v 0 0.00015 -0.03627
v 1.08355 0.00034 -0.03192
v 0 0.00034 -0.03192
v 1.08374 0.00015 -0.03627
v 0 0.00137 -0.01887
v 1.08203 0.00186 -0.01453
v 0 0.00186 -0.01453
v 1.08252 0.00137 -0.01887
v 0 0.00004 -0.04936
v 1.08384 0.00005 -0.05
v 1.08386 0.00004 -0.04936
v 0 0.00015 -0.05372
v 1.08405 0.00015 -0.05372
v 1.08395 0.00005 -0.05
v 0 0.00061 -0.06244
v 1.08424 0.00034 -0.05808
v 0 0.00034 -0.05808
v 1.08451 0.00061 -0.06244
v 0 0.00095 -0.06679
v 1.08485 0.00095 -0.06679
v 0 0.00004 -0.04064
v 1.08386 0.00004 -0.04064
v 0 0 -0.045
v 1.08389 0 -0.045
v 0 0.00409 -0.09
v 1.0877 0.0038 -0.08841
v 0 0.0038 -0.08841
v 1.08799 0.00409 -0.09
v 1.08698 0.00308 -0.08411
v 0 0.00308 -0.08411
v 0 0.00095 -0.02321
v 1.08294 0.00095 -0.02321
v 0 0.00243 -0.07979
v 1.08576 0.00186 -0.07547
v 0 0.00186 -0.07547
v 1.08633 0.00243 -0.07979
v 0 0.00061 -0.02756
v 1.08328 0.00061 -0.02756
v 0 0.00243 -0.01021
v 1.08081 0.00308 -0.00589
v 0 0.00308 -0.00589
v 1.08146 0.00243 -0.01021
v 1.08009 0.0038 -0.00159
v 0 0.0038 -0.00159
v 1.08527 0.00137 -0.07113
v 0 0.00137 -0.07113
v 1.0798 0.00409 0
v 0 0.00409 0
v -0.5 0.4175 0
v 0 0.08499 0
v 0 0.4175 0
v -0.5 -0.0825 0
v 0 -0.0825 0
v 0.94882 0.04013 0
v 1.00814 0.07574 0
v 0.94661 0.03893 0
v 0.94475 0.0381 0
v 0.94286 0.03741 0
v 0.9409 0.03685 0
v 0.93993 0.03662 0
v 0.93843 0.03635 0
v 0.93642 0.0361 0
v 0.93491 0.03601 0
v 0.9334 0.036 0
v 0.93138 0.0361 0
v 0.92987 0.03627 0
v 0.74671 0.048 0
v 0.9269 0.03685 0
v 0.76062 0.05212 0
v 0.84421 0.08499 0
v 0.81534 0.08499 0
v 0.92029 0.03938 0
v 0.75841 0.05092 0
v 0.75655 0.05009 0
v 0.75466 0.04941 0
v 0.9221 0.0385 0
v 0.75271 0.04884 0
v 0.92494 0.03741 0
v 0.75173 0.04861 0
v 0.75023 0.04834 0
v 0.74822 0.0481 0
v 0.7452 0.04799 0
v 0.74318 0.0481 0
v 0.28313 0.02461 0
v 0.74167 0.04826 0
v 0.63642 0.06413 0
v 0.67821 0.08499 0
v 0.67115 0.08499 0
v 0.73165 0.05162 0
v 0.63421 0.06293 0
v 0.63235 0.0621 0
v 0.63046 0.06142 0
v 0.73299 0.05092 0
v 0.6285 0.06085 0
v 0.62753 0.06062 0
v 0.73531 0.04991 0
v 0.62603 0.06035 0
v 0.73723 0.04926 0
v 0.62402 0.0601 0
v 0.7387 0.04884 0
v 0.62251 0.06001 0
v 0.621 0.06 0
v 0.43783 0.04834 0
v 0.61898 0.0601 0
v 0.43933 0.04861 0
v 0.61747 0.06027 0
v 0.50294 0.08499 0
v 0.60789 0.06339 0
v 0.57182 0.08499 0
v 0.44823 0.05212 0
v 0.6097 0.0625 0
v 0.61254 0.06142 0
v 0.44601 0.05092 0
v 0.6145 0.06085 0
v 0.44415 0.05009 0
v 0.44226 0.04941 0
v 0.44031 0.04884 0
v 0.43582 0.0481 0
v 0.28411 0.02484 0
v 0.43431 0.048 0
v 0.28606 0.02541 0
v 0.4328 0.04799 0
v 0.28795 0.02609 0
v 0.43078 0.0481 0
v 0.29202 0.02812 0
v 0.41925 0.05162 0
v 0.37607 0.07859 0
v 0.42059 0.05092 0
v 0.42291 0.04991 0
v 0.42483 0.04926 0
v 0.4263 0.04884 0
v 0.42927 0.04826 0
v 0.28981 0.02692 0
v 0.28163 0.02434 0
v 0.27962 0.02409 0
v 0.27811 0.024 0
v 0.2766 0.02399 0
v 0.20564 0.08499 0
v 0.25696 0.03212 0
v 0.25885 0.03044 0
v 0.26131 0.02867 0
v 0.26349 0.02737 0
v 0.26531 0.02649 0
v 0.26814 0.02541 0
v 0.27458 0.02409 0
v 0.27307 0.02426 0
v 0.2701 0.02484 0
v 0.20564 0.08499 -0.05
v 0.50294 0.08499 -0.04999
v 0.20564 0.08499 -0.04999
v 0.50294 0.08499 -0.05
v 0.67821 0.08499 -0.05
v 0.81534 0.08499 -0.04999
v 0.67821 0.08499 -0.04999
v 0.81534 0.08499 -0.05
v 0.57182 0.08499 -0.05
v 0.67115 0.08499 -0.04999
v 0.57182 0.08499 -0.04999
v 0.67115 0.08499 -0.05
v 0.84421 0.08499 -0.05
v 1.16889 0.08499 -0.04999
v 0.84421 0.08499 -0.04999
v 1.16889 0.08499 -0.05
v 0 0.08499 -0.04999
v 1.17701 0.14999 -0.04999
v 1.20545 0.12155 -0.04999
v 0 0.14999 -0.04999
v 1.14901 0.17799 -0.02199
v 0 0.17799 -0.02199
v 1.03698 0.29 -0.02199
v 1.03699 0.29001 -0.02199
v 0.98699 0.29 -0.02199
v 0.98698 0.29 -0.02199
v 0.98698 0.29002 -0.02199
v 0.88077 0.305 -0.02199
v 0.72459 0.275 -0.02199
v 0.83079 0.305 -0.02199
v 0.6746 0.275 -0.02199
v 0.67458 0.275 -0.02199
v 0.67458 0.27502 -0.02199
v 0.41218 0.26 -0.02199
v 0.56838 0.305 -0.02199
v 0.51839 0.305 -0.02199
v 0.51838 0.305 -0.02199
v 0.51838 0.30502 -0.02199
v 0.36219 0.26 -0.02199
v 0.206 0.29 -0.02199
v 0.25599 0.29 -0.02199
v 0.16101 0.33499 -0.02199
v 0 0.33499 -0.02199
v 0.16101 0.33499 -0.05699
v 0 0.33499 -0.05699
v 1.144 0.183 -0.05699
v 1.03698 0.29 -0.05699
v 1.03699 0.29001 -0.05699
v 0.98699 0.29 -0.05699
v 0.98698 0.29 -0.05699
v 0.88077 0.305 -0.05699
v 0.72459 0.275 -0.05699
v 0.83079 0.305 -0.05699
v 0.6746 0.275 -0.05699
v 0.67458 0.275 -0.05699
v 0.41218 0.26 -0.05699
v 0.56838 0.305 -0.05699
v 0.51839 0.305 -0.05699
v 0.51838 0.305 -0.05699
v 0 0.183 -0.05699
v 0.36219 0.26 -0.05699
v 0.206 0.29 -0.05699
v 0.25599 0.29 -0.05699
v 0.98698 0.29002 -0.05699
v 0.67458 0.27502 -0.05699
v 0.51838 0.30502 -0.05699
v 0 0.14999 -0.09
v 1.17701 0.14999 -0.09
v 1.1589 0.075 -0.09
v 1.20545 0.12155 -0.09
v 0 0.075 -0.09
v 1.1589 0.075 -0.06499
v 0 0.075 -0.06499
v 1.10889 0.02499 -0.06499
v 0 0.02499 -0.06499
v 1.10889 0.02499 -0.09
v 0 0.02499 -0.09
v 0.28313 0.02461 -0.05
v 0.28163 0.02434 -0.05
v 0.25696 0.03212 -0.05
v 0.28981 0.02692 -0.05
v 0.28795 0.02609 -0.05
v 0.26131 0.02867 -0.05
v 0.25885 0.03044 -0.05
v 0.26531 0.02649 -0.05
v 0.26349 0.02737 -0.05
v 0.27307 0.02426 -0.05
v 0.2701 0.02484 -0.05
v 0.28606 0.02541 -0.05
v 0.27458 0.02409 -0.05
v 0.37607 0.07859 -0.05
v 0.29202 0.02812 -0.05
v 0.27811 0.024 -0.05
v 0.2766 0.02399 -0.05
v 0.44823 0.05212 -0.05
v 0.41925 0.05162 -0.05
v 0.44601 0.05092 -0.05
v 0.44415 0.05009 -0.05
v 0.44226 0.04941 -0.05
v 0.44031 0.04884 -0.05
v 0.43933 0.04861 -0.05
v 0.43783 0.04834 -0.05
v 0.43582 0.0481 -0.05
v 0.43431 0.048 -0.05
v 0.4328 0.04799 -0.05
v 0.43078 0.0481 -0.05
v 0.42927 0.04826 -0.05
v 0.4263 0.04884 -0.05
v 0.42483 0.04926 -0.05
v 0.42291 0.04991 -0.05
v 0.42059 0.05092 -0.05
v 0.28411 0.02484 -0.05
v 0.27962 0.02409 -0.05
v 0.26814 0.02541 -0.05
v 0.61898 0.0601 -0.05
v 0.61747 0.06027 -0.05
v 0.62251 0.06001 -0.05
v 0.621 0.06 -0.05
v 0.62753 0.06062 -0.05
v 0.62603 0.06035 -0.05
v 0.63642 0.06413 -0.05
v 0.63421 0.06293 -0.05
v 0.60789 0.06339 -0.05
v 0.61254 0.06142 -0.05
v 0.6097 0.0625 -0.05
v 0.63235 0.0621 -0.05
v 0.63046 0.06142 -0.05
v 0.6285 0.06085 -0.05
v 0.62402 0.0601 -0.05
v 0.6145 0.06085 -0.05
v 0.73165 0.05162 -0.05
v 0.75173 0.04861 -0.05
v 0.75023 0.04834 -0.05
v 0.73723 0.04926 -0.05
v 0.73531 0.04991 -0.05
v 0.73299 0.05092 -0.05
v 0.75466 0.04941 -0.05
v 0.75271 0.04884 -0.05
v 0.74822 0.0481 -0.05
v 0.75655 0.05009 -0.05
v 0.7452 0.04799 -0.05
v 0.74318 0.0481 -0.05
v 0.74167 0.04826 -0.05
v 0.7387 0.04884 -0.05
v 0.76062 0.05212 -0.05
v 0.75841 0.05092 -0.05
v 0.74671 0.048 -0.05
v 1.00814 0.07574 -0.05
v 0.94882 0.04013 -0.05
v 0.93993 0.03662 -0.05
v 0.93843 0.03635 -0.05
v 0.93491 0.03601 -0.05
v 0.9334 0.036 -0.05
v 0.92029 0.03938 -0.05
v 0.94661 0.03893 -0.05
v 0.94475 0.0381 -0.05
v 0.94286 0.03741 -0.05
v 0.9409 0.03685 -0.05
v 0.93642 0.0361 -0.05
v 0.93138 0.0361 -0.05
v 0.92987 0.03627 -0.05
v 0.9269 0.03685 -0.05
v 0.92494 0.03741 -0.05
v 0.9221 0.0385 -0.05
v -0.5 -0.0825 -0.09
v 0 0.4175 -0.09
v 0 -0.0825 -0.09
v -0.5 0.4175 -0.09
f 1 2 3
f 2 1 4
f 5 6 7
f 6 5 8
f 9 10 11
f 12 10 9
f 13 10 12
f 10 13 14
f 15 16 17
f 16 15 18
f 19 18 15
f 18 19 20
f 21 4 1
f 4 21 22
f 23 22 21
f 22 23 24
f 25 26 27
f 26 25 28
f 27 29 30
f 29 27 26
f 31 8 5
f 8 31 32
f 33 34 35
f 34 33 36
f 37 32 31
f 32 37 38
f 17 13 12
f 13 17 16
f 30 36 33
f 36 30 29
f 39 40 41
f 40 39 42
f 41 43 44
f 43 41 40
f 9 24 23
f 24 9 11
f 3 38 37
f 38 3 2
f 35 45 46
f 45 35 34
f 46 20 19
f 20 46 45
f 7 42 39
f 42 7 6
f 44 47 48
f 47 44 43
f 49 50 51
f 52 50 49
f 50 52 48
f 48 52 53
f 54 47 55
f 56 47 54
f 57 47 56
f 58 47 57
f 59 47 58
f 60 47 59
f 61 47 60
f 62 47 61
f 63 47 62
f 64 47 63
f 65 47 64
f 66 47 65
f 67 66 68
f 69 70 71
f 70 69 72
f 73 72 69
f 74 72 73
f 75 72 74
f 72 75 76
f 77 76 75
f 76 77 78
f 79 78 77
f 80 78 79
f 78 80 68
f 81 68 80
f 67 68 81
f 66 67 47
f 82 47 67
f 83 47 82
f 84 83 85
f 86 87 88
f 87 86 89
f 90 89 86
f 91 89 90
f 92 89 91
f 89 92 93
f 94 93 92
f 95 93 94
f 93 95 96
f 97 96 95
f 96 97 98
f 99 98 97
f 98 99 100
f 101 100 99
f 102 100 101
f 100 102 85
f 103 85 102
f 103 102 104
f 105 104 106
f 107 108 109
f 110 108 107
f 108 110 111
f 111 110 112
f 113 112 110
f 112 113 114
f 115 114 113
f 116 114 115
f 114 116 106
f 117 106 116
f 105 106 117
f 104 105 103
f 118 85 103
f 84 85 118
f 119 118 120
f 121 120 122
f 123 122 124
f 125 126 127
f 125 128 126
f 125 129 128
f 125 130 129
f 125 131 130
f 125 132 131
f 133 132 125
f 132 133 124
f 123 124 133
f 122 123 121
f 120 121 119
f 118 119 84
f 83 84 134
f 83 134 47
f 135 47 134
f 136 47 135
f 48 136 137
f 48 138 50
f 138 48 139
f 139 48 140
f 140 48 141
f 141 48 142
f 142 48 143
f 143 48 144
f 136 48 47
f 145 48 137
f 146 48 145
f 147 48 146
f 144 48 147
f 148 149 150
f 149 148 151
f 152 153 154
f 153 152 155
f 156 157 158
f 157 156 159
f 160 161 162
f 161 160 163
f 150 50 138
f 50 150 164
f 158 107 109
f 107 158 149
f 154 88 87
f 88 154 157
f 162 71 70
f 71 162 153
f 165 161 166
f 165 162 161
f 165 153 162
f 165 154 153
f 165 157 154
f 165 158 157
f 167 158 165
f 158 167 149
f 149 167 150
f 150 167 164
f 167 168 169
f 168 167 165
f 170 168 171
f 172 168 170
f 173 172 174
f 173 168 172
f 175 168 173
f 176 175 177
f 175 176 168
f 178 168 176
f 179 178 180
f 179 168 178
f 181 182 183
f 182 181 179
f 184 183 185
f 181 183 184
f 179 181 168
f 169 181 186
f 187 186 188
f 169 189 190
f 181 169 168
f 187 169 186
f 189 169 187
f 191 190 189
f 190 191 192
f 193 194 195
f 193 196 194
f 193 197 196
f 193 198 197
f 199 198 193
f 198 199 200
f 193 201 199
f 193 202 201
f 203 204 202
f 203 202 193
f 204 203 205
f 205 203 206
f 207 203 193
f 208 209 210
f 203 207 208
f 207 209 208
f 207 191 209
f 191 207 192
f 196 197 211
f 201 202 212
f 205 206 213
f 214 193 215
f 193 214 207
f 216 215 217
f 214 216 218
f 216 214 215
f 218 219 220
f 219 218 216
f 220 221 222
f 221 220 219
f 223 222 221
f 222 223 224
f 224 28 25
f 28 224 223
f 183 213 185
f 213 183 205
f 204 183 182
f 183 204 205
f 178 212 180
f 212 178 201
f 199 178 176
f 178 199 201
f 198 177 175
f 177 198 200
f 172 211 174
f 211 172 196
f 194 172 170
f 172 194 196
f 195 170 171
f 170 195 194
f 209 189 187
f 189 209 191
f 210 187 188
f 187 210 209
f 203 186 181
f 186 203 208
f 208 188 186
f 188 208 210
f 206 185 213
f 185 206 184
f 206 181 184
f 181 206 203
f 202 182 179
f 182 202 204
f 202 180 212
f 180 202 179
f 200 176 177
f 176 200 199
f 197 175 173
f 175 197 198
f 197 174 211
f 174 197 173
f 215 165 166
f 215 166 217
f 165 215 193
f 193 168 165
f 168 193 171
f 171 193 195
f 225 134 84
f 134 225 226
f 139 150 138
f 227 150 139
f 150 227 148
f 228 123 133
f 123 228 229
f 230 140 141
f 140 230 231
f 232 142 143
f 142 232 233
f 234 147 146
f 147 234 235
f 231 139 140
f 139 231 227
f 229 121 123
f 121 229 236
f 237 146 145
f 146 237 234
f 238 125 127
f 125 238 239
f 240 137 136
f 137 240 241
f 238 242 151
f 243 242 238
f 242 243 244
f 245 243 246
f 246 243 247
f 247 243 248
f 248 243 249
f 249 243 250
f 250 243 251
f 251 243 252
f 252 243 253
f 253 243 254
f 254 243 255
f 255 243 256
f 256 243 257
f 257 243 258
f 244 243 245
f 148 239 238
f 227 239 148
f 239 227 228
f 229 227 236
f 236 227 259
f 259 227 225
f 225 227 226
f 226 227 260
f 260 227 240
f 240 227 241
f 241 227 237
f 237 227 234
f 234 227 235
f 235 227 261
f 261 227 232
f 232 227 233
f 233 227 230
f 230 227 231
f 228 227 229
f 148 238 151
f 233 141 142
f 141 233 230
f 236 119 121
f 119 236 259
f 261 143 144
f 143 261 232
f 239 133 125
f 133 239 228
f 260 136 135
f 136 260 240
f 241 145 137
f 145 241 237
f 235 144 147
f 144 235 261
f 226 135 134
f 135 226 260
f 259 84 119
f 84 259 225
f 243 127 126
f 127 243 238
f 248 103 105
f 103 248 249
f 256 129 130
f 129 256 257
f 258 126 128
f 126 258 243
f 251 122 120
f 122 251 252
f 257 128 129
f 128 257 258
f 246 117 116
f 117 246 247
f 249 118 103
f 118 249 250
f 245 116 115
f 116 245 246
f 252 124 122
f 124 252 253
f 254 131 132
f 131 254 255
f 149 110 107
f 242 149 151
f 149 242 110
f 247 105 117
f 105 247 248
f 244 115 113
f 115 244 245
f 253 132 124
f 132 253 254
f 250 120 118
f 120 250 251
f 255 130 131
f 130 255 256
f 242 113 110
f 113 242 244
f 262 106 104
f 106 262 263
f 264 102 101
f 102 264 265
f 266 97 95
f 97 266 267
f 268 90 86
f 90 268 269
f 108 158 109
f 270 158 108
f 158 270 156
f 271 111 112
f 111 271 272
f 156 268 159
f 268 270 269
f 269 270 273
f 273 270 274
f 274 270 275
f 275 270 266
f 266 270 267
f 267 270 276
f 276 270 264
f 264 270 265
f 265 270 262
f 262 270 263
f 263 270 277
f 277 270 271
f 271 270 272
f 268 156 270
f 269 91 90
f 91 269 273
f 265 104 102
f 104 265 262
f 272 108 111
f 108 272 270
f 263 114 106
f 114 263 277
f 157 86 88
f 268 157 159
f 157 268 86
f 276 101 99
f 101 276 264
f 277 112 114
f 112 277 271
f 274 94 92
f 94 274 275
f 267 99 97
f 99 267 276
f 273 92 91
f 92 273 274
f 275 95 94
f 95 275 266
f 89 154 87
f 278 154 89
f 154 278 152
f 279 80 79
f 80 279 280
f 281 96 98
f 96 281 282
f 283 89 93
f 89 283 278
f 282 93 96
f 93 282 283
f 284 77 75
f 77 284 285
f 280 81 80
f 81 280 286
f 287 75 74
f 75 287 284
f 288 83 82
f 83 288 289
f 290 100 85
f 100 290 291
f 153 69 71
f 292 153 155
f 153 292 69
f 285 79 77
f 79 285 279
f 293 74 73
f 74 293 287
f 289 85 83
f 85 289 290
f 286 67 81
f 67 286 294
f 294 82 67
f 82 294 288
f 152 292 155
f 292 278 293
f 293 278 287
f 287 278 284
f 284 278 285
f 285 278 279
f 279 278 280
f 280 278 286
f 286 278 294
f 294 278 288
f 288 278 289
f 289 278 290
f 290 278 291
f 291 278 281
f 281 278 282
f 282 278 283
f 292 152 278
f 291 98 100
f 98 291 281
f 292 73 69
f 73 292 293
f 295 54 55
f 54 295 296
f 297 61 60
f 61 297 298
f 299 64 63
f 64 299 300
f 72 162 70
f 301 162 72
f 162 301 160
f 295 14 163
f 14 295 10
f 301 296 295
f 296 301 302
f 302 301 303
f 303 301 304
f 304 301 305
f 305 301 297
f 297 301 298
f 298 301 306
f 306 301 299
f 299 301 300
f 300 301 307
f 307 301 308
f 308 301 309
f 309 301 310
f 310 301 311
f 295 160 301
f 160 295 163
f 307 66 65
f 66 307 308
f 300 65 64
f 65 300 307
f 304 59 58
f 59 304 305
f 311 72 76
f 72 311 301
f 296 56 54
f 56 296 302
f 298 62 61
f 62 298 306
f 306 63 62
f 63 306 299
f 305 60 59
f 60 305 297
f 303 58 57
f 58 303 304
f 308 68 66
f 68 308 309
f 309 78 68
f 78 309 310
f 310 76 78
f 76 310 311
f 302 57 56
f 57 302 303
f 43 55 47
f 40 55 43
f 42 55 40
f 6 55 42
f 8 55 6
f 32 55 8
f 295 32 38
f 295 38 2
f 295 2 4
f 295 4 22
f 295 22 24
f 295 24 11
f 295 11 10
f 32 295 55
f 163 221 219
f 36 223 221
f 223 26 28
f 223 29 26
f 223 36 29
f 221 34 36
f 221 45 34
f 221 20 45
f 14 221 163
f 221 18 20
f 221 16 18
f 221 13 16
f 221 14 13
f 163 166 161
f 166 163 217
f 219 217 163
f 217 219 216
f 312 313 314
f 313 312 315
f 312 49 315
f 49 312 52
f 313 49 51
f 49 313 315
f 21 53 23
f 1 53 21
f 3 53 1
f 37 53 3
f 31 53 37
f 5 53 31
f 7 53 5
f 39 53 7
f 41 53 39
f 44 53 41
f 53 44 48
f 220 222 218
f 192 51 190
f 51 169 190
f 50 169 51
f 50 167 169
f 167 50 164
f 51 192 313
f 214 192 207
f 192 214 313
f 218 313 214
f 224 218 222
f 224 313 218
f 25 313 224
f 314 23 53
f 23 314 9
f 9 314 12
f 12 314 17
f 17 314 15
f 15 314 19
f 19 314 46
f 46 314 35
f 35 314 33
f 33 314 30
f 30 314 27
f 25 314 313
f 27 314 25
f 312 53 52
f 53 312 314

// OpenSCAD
// file: config.scad
// Axis conventions:
//   X ("length"): longest dimension of a key.
//     0 at the intersection of bow and blade,
//     increasing towards the end of the blade.
//   Y ("height"): dimension that lifts the pins.
//     0 at bottom of key,
//     increasing towards the bitting.
//   Z ("thickness"): shortest dimension of a key.
//     0 at the right (sidebar) side of the key,
//     *decreasing* towards the left side.
//   All measurements are in inches.

// *************************
// * General configuration *
// *************************

// Length at which the blade of the key will be truncated.
blade_length = 1.242;  // measured from key

// Thickness of the key at the widest point.
key_thickness = 0.090;  // measured from key

// Height of the blade of the key.  All cut depths are indexed from here.
blade_height = 0.335;  // from schlage spec

// Size of the bow.  This property is purely cosmetic.
bow_size = 0.500;

// Radius of a lock cylinder (used to round the bottom of the key).
cylinder_radius = 0.250;  // from schlage spec

// *********
// * Wards *
// *********

// Height between the bottom of the lowest ward and the bottom of the key.
bottom_ward_offset = 0.025;  // measured from lock

// Height of the lowest ward.
bottom_ward_height = 0.050;  // measured from lock

// Thickness of the lowest ward.
bottom_ward_thickness = 0.025;  // measured from lock

// Thickness of the ward above the sidebar.
// (This is a bit larger than sidebar_thickness.)
sidebar_ward_thickness = 0.050;  // measured from key

// Height above the bottom of the key where the sidebar ward begins to taper
// outwards towards the top half of the blade.
sidebar_ward_chamfer_height = 0.150;  // measured from lock

// Height above the bottom of the key where the non-sidebar side begins to
// taper inwards towards the top half of the blade.
top_chamfer_height = 0.150;  // measured from lock

// Thickness between the top half of the blade and the sidebar side of the key.
top_offset = 0.022;  // measured from lock

// Thickness of the top half of the blade.
top_thickness = 0.035;  // measured from lock

// ***************
// * Top bitting *
// ***************

// Length between the bow and the center of the first cut.
bitting_start = 0.231;  // from schlage spec

// Length between neighboring cuts.
bitting_step = 0.1562;  // from schlage spec

// Height increment used to define cut depths.
cut_step = 0.015;  // from schlage spec

// Size of the flat spot at the center of each cut.
cut_length = 0.050;  // from schlage spec, with some extra margin

// Height of the control cut for LFIC cylinders.
control_height = 0.244;  // measured from key

// ***********
// * Sidebar *
// ***********

// Thickness of the sidebar cuts from the right side of the key.
sidebar_thickness = 0.050;  // measured from key

// Height of the top of the sidebar cuts from the bottom of the key.
sidebar_top_height = 0.085;  // measured from key

// Effective radius of the bottom of a finger pin.
sidebar_radius = 0.029;  // measured from lock

// Heights of the bottoms of sidebar cuts.  lr = left/right, ctr = center.
sidebar_deep_lr_height = 0.024;  // measured from key
sidebar_deep_ctr_height = 0.036;  // measured from key
sidebar_shallow_lr_height = 0.048;  // measured from key
sidebar_shallow_ctr_height = 0.060;  // measured from key

// Length offset of a left or right cut from the nominal center position.
sidebar_lr_offset = 0.032;  // measured from key

// Maximum length that a finger pin is able to move from the nominal center.
// Used to determine how far ramps must extend to the side of each cut.
sidebar_max_offset = 0.065;  // deduced from cutaway lock

// Minimum slope of a cut such that a finger pin will still fall to the center.
sidebar_min_slope = 0.6;  // deduced from cutaway lock
// main file
include <config.scad>;

// Extend 2D shapes to span the thickness of the key in the X-Y plane.
module extrude() {
  for (i = [0 : $children - 1])
      translate([0, 0, -key_thickness])
            linear_extrude(height = key_thickness)
	            child(i);
		    }

// Handle of the key.
module bow() {
  extrude()
      translate([-bow_size / 2, blade_height / 2])
            square(bow_size, center = true);
	    }

// All material that should be subtracted to make a working top bitting.
module bitting(code, control, minimal) {
  // Function that gives the height of cut i
    function height(i) = (i == 6 ? control_height - blade_height :
    	     	       	 -1 * code[i] * cut_step);
			   last_cut = control ? 6 : 5;
			     translate([bitting_start - cut_length / 2, blade_height]) {
			         extrude() {
				       // The cuts themselves.
				             for(i = [0 : last_cut])
					             translate([i * bitting_step, height(i)])
						               minkowski() {
							                   rotate([0, 0, 45]) square(blade_height);
									               square([cut_length, blade_height]);
										                 }
												       // Ramps between the cuts.
												             if(minimal)
													             for(i = [0 : last_cut - 1])
														               translate([i * bitting_step, 0])
															                   polygon([[cut_length, 0], [cut_length, height(i)],
																	                        [bitting_step, height(i + 1)], [bitting_step, 0]]);
																				      // Chamfer down from the last cut, with a bump iff minimal = false.
																				            translate([last_cut * bitting_step + cut_length,
																					    			   (minimal || control) ? height(last_cut) : 0])
																								           polygon([[-1, 1], [2, 1], [2, -2]] * blade_height);
																									       }
																									         }
																										 }

// 2D area that shall be subtracted to make the ramps for one finger pin.
module sidebar_ramp(offset, height) {
  max_offset = (sidebar_top_height - height) / sidebar_min_slope;
    left_offset = bitting_step - sidebar_max_offset + offset;
      right_offset = bitting_step - sidebar_max_offset - offset;
        intersection() {
	    minkowski() {
	          // Cutting tool
		        circle(sidebar_radius, $fn = 360);
			      // Tool path
			            translate([offset, sidebar_radius])
				            polygon([[0, height],
					                     [-min(left_offset, max_offset), sidebar_top_height],
							                      [min(right_offset, max_offset), sidebar_top_height]]);
									          }
										      // Ignore the extra tool path above the sidebar.
										          square([blade_length, 2 * sidebar_top_height], center = true);
											    }
											    }

// Material that shall be subtracted to make a complete working sidebar.
module sidebar(code) {
  // Lists indexed by sidebar codes: 0 = no cut, 1-6 are according to the spec.
    offsets = [0, -sidebar_lr_offset, -sidebar_lr_offset,
                 0, 0, sidebar_lr_offset, sidebar_lr_offset];
		   heights = [blade_height, sidebar_shallow_lr_height,
		                sidebar_deep_lr_height, sidebar_shallow_ctr_height,
				             sidebar_deep_ctr_height, sidebar_shallow_lr_height,
					                  sidebar_deep_lr_height];
							    // Length coordinate of the end of the final sidebar ramp.
							      end = bitting_start + 4.5 * bitting_step + sidebar_max_offset +
							            sidebar_top_height;
								      // Paths to be removed from the side of the key:
								        translate([0, 0, -sidebar_thickness]) {
									    // Sidebar bitting.
									        for(i = [0 : 4])
										      linear_extrude(height = key_thickness)
										              translate([bitting_start + (i + .5) * bitting_step, 0])
											                sidebar_ramp(offsets[code[i]], heights[code[i]]);
													    // Final ramp down.
													        linear_extrude(height = key_thickness)
														      polygon([[blade_length, 0], [blade_length, sidebar_top_height],
														                     [end - sidebar_top_height, sidebar_top_height], [end, 0]]);
																       }
																         // Chamfer up from the end of the sidebar.
																	   extrude()
																	       translate([end, 0])
																	             polygon([[0, 0], [2, 2], [2, 0]] * blade_height);
																		     }

// 2D cross section of keyway wards, in the Z-Y plane.
module wards() {
  difference() {
      // Top half of blade and ward above sidebar.
          polygon([[0, 0],
	               [-key_thickness, 0],
		                    [-key_thickness, top_chamfer_height],
				                 [-top_offset - top_thickness, top_chamfer_height +
						               key_thickness - top_offset - top_thickness],
							                    [-top_offset - top_thickness, blade_height],
									                 [-top_offset, blade_height],
											              [-top_offset, sidebar_ward_chamfer_height +
												                    sidebar_ward_thickness - top_offset],
														                 [-sidebar_ward_thickness, sidebar_ward_chamfer_height],
																              [-sidebar_ward_thickness, sidebar_top_height],
																	                   [0, sidebar_top_height]]);
																			       // Bottom ward.
																			           translate([-key_thickness, bottom_ward_offset])
																				         square([bottom_ward_thickness, bottom_ward_height]);
																					   }
																					   }

// Constraints of the lock cylinder: wards, maximum key length, and rounding.
module envelope() {
  eps = .001; // extra overlap to join the blade with the bow
    intersection() {
        // Cylinder, to round off the bottom of the key.
	    translate([-eps, cylinder_radius, -key_thickness / 2])
	          rotate([0, 90, 0])
		          cylinder(blade_length + eps, r = cylinder_radius, $fn = 360);
			      // Box to trim the sides.  Without it we get 0-thickness artifacts.
			          extrude()
				        translate([-eps, 0])
					        square([blade_length + eps, blade_height]);
						    // Extrude the cross section of the wards.
						        translate([blade_length, 0])
							      rotate([0, -90, 0])
							              linear_extrude(height = blade_length + eps)
								                wards();
										  }
										  }

// top_code is a list of 6 integers describing the top bitting.
// side_code is a list of 5 integers describing the sidebar bitting.
// If control = true, a LFIC removal key will be created.
// If minimal = true, there will be flat ramps between the cuts.
// If minimal = false, the usual bumps will be placed between the cuts.
module key(top_code, side_code, control = false, minimal = true) {
  bow();
    difference() {
        envelope();
	    bitting(top_code, control, minimal);
	        sidebar(side_code);
		  }
		  }

key([3,5,2,4,2,3],[2,1,3,1,4],false,true);
